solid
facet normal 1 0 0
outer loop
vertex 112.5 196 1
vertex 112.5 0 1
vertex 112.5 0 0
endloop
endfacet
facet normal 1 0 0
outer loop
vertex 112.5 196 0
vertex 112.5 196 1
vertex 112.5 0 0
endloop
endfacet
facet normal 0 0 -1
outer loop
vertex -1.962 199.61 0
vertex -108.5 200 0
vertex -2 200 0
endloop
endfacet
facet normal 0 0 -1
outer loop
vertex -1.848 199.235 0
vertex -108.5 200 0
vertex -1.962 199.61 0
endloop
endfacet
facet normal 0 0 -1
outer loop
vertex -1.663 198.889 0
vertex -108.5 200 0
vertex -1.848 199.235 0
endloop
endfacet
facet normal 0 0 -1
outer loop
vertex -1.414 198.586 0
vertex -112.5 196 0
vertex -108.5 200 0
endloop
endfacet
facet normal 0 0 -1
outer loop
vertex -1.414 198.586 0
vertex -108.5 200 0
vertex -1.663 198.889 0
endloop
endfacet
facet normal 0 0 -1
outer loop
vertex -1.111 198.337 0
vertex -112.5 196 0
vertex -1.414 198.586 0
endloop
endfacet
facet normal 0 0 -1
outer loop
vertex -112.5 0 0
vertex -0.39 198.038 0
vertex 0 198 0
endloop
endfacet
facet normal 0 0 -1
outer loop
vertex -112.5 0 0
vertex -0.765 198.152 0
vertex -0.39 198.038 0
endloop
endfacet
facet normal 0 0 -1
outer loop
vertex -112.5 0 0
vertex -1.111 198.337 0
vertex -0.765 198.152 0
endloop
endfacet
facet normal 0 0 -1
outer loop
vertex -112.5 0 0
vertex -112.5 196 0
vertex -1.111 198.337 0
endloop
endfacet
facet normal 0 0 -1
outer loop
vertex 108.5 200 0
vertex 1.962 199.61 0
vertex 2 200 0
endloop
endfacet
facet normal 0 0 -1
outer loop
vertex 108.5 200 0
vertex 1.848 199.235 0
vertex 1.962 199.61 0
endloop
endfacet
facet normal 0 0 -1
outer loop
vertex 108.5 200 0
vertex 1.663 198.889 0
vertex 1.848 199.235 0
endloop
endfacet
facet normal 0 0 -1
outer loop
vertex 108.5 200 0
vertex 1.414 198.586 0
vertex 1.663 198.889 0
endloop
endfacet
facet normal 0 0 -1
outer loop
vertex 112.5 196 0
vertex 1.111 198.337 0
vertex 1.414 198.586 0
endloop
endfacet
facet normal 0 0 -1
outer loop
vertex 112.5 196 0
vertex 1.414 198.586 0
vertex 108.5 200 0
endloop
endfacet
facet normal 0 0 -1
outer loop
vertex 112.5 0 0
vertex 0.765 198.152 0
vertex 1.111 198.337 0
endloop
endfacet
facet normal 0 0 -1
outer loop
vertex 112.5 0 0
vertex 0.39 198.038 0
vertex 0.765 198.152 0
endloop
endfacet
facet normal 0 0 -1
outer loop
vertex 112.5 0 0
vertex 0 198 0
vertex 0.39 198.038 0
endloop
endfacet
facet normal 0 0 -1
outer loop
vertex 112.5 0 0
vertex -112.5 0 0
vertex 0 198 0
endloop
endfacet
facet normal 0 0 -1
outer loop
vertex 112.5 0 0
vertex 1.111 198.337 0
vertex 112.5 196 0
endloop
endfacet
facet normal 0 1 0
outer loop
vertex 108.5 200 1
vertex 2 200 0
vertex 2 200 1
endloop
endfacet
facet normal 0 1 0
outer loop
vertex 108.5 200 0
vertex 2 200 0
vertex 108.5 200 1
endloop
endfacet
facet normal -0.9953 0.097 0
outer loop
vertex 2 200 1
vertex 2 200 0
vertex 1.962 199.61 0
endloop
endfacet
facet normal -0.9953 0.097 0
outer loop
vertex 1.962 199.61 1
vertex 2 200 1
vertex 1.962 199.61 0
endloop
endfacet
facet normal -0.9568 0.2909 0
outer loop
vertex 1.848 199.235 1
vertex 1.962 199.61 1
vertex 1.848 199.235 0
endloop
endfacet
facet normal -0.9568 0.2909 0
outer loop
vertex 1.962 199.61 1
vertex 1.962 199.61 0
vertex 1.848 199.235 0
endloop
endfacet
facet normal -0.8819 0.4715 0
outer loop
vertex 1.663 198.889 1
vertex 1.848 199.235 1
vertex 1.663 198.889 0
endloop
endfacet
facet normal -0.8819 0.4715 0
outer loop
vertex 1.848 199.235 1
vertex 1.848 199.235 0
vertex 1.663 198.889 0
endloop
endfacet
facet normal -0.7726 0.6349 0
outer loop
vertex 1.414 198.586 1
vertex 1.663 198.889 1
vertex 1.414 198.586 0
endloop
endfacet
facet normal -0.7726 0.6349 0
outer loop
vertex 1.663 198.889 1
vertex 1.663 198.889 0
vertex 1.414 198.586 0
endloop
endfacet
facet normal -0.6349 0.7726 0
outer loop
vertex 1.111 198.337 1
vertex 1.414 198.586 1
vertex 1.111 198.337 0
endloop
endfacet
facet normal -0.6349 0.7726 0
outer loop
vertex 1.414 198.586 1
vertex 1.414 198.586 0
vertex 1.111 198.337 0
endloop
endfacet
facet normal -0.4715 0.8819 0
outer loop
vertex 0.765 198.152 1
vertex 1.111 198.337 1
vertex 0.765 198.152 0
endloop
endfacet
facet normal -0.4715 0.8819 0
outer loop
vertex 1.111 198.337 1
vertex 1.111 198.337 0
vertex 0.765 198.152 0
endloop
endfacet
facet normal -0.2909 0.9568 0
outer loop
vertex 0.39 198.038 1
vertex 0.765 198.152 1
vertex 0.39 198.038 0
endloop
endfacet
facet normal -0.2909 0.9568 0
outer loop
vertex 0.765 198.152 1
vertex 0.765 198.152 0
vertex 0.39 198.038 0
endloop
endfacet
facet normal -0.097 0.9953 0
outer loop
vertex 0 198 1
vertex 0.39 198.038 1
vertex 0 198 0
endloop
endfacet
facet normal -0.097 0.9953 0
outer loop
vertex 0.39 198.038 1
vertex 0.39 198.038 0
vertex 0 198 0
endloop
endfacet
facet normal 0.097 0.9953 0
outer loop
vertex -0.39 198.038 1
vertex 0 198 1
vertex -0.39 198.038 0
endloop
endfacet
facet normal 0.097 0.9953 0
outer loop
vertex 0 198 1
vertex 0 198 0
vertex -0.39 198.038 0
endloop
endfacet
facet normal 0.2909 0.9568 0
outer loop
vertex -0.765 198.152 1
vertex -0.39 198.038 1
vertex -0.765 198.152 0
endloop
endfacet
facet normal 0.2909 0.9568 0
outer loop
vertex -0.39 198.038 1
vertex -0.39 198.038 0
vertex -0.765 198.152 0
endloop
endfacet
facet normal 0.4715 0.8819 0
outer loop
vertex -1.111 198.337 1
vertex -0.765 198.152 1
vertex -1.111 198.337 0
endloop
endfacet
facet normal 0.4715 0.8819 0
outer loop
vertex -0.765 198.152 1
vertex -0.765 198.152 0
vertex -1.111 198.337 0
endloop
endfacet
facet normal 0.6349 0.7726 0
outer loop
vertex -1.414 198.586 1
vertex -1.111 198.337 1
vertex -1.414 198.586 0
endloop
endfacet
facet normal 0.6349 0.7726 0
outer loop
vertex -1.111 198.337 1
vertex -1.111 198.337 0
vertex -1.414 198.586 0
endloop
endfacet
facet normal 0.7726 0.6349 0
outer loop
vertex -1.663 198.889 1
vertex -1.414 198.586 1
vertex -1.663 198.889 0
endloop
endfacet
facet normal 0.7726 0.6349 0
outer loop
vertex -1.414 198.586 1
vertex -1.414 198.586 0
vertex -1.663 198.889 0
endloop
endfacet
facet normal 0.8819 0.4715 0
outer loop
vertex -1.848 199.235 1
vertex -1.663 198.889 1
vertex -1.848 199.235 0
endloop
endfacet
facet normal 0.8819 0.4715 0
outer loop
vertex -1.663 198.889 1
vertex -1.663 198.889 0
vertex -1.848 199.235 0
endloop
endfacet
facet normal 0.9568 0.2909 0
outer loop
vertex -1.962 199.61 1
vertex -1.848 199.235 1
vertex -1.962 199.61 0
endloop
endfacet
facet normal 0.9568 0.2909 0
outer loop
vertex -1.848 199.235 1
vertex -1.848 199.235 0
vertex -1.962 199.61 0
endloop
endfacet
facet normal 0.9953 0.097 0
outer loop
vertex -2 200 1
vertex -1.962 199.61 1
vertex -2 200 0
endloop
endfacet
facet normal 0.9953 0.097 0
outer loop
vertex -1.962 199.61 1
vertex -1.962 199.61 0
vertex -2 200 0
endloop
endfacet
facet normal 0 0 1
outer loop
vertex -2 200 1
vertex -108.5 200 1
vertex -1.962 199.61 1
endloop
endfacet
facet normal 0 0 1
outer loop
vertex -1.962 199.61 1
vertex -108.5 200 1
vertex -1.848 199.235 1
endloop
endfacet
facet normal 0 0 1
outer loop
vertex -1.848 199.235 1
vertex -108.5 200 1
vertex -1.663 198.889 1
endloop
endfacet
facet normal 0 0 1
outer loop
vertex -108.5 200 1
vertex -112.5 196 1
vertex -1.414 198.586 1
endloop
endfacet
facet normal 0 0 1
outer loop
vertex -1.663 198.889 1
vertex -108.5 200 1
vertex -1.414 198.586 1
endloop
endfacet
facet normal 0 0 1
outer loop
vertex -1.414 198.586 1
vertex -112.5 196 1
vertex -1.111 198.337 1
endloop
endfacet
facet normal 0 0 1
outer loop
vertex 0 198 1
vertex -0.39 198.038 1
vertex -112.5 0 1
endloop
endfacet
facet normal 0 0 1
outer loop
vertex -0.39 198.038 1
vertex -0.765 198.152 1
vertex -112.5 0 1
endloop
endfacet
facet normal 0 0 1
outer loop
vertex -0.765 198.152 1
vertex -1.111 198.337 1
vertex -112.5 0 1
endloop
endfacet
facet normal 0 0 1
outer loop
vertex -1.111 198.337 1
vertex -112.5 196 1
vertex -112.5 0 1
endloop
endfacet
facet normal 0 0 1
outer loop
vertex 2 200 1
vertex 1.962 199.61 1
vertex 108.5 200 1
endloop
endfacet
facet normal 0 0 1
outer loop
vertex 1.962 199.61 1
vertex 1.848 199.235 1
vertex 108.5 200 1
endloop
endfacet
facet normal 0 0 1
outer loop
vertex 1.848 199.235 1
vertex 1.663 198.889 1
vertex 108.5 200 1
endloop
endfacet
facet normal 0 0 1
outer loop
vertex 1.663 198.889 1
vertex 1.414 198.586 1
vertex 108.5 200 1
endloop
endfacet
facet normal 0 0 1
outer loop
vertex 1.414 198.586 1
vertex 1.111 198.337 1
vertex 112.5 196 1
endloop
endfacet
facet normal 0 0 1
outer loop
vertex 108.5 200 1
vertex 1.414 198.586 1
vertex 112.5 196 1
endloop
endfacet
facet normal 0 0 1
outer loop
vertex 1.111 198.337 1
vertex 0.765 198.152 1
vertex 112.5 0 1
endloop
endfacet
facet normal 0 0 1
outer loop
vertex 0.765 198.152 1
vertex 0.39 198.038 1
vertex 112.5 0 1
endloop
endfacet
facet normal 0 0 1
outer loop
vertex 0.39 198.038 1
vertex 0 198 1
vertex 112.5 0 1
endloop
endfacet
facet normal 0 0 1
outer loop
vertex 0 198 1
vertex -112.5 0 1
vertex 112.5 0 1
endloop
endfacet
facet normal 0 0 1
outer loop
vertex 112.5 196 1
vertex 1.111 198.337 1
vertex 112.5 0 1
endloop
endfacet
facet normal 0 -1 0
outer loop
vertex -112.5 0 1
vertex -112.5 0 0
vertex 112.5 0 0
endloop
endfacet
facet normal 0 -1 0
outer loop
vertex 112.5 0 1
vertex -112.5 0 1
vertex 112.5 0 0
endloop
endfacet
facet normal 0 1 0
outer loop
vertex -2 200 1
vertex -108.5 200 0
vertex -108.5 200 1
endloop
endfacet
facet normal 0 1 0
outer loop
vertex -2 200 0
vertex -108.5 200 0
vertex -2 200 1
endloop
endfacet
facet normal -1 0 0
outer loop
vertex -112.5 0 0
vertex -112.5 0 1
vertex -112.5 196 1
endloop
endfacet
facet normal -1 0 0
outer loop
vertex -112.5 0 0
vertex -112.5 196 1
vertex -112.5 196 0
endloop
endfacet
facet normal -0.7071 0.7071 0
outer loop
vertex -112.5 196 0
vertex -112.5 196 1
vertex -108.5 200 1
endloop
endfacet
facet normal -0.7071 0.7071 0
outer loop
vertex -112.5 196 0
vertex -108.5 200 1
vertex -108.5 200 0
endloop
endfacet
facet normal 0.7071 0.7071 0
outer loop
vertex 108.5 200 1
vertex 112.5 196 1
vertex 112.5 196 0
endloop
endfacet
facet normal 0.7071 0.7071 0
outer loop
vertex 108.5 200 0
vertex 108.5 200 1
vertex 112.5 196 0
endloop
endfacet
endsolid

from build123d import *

# Parameters (mm, degrees)
SKETCH1_W          = 225
SKETCH1_H          = 1
BASE_FLANGE1_DEPTH = 200
CHAMFER1_SIZE      = 4
SKETCH2_R          = 2
CUT_EXTRUDE1_DEPTH = 230.471675812


# Sheet-metal steps are written as plain solids
with BuildPart() as part:
    # Sketch1 → Base-Flange1 (new body)
    with BuildSketch(Plane(origin=(0, 0, 0), x_dir=(1, 0, 0), z_dir=(0, 1, 0))):
        with Locations((0, -0.5)):
            Rectangle(SKETCH1_W, SKETCH1_H)
    extrude(amount=BASE_FLANGE1_DEPTH)

    # Chamfer1
    chamfer1_edges = [part.edges().sort_by_distance(p)[0] for p in [
        (-112.5, 200, 0.5),
        (112.5, 200, 0.5),
    ]]
    chamfer(chamfer1_edges, length=CHAMFER1_SIZE)

    # Sketch2 → Cut-Extrude1 (cut, through all)
    with BuildSketch(Plane(origin=(0, 0, 0), x_dir=(-1, 0, 0), z_dir=(0, 0, -1))):
        with Locations((0, 200)):
            Circle(SKETCH2_R)
    extrude(amount=-CUT_EXTRUDE1_DEPTH, mode=Mode.SUBTRACT)


solid = part.part
